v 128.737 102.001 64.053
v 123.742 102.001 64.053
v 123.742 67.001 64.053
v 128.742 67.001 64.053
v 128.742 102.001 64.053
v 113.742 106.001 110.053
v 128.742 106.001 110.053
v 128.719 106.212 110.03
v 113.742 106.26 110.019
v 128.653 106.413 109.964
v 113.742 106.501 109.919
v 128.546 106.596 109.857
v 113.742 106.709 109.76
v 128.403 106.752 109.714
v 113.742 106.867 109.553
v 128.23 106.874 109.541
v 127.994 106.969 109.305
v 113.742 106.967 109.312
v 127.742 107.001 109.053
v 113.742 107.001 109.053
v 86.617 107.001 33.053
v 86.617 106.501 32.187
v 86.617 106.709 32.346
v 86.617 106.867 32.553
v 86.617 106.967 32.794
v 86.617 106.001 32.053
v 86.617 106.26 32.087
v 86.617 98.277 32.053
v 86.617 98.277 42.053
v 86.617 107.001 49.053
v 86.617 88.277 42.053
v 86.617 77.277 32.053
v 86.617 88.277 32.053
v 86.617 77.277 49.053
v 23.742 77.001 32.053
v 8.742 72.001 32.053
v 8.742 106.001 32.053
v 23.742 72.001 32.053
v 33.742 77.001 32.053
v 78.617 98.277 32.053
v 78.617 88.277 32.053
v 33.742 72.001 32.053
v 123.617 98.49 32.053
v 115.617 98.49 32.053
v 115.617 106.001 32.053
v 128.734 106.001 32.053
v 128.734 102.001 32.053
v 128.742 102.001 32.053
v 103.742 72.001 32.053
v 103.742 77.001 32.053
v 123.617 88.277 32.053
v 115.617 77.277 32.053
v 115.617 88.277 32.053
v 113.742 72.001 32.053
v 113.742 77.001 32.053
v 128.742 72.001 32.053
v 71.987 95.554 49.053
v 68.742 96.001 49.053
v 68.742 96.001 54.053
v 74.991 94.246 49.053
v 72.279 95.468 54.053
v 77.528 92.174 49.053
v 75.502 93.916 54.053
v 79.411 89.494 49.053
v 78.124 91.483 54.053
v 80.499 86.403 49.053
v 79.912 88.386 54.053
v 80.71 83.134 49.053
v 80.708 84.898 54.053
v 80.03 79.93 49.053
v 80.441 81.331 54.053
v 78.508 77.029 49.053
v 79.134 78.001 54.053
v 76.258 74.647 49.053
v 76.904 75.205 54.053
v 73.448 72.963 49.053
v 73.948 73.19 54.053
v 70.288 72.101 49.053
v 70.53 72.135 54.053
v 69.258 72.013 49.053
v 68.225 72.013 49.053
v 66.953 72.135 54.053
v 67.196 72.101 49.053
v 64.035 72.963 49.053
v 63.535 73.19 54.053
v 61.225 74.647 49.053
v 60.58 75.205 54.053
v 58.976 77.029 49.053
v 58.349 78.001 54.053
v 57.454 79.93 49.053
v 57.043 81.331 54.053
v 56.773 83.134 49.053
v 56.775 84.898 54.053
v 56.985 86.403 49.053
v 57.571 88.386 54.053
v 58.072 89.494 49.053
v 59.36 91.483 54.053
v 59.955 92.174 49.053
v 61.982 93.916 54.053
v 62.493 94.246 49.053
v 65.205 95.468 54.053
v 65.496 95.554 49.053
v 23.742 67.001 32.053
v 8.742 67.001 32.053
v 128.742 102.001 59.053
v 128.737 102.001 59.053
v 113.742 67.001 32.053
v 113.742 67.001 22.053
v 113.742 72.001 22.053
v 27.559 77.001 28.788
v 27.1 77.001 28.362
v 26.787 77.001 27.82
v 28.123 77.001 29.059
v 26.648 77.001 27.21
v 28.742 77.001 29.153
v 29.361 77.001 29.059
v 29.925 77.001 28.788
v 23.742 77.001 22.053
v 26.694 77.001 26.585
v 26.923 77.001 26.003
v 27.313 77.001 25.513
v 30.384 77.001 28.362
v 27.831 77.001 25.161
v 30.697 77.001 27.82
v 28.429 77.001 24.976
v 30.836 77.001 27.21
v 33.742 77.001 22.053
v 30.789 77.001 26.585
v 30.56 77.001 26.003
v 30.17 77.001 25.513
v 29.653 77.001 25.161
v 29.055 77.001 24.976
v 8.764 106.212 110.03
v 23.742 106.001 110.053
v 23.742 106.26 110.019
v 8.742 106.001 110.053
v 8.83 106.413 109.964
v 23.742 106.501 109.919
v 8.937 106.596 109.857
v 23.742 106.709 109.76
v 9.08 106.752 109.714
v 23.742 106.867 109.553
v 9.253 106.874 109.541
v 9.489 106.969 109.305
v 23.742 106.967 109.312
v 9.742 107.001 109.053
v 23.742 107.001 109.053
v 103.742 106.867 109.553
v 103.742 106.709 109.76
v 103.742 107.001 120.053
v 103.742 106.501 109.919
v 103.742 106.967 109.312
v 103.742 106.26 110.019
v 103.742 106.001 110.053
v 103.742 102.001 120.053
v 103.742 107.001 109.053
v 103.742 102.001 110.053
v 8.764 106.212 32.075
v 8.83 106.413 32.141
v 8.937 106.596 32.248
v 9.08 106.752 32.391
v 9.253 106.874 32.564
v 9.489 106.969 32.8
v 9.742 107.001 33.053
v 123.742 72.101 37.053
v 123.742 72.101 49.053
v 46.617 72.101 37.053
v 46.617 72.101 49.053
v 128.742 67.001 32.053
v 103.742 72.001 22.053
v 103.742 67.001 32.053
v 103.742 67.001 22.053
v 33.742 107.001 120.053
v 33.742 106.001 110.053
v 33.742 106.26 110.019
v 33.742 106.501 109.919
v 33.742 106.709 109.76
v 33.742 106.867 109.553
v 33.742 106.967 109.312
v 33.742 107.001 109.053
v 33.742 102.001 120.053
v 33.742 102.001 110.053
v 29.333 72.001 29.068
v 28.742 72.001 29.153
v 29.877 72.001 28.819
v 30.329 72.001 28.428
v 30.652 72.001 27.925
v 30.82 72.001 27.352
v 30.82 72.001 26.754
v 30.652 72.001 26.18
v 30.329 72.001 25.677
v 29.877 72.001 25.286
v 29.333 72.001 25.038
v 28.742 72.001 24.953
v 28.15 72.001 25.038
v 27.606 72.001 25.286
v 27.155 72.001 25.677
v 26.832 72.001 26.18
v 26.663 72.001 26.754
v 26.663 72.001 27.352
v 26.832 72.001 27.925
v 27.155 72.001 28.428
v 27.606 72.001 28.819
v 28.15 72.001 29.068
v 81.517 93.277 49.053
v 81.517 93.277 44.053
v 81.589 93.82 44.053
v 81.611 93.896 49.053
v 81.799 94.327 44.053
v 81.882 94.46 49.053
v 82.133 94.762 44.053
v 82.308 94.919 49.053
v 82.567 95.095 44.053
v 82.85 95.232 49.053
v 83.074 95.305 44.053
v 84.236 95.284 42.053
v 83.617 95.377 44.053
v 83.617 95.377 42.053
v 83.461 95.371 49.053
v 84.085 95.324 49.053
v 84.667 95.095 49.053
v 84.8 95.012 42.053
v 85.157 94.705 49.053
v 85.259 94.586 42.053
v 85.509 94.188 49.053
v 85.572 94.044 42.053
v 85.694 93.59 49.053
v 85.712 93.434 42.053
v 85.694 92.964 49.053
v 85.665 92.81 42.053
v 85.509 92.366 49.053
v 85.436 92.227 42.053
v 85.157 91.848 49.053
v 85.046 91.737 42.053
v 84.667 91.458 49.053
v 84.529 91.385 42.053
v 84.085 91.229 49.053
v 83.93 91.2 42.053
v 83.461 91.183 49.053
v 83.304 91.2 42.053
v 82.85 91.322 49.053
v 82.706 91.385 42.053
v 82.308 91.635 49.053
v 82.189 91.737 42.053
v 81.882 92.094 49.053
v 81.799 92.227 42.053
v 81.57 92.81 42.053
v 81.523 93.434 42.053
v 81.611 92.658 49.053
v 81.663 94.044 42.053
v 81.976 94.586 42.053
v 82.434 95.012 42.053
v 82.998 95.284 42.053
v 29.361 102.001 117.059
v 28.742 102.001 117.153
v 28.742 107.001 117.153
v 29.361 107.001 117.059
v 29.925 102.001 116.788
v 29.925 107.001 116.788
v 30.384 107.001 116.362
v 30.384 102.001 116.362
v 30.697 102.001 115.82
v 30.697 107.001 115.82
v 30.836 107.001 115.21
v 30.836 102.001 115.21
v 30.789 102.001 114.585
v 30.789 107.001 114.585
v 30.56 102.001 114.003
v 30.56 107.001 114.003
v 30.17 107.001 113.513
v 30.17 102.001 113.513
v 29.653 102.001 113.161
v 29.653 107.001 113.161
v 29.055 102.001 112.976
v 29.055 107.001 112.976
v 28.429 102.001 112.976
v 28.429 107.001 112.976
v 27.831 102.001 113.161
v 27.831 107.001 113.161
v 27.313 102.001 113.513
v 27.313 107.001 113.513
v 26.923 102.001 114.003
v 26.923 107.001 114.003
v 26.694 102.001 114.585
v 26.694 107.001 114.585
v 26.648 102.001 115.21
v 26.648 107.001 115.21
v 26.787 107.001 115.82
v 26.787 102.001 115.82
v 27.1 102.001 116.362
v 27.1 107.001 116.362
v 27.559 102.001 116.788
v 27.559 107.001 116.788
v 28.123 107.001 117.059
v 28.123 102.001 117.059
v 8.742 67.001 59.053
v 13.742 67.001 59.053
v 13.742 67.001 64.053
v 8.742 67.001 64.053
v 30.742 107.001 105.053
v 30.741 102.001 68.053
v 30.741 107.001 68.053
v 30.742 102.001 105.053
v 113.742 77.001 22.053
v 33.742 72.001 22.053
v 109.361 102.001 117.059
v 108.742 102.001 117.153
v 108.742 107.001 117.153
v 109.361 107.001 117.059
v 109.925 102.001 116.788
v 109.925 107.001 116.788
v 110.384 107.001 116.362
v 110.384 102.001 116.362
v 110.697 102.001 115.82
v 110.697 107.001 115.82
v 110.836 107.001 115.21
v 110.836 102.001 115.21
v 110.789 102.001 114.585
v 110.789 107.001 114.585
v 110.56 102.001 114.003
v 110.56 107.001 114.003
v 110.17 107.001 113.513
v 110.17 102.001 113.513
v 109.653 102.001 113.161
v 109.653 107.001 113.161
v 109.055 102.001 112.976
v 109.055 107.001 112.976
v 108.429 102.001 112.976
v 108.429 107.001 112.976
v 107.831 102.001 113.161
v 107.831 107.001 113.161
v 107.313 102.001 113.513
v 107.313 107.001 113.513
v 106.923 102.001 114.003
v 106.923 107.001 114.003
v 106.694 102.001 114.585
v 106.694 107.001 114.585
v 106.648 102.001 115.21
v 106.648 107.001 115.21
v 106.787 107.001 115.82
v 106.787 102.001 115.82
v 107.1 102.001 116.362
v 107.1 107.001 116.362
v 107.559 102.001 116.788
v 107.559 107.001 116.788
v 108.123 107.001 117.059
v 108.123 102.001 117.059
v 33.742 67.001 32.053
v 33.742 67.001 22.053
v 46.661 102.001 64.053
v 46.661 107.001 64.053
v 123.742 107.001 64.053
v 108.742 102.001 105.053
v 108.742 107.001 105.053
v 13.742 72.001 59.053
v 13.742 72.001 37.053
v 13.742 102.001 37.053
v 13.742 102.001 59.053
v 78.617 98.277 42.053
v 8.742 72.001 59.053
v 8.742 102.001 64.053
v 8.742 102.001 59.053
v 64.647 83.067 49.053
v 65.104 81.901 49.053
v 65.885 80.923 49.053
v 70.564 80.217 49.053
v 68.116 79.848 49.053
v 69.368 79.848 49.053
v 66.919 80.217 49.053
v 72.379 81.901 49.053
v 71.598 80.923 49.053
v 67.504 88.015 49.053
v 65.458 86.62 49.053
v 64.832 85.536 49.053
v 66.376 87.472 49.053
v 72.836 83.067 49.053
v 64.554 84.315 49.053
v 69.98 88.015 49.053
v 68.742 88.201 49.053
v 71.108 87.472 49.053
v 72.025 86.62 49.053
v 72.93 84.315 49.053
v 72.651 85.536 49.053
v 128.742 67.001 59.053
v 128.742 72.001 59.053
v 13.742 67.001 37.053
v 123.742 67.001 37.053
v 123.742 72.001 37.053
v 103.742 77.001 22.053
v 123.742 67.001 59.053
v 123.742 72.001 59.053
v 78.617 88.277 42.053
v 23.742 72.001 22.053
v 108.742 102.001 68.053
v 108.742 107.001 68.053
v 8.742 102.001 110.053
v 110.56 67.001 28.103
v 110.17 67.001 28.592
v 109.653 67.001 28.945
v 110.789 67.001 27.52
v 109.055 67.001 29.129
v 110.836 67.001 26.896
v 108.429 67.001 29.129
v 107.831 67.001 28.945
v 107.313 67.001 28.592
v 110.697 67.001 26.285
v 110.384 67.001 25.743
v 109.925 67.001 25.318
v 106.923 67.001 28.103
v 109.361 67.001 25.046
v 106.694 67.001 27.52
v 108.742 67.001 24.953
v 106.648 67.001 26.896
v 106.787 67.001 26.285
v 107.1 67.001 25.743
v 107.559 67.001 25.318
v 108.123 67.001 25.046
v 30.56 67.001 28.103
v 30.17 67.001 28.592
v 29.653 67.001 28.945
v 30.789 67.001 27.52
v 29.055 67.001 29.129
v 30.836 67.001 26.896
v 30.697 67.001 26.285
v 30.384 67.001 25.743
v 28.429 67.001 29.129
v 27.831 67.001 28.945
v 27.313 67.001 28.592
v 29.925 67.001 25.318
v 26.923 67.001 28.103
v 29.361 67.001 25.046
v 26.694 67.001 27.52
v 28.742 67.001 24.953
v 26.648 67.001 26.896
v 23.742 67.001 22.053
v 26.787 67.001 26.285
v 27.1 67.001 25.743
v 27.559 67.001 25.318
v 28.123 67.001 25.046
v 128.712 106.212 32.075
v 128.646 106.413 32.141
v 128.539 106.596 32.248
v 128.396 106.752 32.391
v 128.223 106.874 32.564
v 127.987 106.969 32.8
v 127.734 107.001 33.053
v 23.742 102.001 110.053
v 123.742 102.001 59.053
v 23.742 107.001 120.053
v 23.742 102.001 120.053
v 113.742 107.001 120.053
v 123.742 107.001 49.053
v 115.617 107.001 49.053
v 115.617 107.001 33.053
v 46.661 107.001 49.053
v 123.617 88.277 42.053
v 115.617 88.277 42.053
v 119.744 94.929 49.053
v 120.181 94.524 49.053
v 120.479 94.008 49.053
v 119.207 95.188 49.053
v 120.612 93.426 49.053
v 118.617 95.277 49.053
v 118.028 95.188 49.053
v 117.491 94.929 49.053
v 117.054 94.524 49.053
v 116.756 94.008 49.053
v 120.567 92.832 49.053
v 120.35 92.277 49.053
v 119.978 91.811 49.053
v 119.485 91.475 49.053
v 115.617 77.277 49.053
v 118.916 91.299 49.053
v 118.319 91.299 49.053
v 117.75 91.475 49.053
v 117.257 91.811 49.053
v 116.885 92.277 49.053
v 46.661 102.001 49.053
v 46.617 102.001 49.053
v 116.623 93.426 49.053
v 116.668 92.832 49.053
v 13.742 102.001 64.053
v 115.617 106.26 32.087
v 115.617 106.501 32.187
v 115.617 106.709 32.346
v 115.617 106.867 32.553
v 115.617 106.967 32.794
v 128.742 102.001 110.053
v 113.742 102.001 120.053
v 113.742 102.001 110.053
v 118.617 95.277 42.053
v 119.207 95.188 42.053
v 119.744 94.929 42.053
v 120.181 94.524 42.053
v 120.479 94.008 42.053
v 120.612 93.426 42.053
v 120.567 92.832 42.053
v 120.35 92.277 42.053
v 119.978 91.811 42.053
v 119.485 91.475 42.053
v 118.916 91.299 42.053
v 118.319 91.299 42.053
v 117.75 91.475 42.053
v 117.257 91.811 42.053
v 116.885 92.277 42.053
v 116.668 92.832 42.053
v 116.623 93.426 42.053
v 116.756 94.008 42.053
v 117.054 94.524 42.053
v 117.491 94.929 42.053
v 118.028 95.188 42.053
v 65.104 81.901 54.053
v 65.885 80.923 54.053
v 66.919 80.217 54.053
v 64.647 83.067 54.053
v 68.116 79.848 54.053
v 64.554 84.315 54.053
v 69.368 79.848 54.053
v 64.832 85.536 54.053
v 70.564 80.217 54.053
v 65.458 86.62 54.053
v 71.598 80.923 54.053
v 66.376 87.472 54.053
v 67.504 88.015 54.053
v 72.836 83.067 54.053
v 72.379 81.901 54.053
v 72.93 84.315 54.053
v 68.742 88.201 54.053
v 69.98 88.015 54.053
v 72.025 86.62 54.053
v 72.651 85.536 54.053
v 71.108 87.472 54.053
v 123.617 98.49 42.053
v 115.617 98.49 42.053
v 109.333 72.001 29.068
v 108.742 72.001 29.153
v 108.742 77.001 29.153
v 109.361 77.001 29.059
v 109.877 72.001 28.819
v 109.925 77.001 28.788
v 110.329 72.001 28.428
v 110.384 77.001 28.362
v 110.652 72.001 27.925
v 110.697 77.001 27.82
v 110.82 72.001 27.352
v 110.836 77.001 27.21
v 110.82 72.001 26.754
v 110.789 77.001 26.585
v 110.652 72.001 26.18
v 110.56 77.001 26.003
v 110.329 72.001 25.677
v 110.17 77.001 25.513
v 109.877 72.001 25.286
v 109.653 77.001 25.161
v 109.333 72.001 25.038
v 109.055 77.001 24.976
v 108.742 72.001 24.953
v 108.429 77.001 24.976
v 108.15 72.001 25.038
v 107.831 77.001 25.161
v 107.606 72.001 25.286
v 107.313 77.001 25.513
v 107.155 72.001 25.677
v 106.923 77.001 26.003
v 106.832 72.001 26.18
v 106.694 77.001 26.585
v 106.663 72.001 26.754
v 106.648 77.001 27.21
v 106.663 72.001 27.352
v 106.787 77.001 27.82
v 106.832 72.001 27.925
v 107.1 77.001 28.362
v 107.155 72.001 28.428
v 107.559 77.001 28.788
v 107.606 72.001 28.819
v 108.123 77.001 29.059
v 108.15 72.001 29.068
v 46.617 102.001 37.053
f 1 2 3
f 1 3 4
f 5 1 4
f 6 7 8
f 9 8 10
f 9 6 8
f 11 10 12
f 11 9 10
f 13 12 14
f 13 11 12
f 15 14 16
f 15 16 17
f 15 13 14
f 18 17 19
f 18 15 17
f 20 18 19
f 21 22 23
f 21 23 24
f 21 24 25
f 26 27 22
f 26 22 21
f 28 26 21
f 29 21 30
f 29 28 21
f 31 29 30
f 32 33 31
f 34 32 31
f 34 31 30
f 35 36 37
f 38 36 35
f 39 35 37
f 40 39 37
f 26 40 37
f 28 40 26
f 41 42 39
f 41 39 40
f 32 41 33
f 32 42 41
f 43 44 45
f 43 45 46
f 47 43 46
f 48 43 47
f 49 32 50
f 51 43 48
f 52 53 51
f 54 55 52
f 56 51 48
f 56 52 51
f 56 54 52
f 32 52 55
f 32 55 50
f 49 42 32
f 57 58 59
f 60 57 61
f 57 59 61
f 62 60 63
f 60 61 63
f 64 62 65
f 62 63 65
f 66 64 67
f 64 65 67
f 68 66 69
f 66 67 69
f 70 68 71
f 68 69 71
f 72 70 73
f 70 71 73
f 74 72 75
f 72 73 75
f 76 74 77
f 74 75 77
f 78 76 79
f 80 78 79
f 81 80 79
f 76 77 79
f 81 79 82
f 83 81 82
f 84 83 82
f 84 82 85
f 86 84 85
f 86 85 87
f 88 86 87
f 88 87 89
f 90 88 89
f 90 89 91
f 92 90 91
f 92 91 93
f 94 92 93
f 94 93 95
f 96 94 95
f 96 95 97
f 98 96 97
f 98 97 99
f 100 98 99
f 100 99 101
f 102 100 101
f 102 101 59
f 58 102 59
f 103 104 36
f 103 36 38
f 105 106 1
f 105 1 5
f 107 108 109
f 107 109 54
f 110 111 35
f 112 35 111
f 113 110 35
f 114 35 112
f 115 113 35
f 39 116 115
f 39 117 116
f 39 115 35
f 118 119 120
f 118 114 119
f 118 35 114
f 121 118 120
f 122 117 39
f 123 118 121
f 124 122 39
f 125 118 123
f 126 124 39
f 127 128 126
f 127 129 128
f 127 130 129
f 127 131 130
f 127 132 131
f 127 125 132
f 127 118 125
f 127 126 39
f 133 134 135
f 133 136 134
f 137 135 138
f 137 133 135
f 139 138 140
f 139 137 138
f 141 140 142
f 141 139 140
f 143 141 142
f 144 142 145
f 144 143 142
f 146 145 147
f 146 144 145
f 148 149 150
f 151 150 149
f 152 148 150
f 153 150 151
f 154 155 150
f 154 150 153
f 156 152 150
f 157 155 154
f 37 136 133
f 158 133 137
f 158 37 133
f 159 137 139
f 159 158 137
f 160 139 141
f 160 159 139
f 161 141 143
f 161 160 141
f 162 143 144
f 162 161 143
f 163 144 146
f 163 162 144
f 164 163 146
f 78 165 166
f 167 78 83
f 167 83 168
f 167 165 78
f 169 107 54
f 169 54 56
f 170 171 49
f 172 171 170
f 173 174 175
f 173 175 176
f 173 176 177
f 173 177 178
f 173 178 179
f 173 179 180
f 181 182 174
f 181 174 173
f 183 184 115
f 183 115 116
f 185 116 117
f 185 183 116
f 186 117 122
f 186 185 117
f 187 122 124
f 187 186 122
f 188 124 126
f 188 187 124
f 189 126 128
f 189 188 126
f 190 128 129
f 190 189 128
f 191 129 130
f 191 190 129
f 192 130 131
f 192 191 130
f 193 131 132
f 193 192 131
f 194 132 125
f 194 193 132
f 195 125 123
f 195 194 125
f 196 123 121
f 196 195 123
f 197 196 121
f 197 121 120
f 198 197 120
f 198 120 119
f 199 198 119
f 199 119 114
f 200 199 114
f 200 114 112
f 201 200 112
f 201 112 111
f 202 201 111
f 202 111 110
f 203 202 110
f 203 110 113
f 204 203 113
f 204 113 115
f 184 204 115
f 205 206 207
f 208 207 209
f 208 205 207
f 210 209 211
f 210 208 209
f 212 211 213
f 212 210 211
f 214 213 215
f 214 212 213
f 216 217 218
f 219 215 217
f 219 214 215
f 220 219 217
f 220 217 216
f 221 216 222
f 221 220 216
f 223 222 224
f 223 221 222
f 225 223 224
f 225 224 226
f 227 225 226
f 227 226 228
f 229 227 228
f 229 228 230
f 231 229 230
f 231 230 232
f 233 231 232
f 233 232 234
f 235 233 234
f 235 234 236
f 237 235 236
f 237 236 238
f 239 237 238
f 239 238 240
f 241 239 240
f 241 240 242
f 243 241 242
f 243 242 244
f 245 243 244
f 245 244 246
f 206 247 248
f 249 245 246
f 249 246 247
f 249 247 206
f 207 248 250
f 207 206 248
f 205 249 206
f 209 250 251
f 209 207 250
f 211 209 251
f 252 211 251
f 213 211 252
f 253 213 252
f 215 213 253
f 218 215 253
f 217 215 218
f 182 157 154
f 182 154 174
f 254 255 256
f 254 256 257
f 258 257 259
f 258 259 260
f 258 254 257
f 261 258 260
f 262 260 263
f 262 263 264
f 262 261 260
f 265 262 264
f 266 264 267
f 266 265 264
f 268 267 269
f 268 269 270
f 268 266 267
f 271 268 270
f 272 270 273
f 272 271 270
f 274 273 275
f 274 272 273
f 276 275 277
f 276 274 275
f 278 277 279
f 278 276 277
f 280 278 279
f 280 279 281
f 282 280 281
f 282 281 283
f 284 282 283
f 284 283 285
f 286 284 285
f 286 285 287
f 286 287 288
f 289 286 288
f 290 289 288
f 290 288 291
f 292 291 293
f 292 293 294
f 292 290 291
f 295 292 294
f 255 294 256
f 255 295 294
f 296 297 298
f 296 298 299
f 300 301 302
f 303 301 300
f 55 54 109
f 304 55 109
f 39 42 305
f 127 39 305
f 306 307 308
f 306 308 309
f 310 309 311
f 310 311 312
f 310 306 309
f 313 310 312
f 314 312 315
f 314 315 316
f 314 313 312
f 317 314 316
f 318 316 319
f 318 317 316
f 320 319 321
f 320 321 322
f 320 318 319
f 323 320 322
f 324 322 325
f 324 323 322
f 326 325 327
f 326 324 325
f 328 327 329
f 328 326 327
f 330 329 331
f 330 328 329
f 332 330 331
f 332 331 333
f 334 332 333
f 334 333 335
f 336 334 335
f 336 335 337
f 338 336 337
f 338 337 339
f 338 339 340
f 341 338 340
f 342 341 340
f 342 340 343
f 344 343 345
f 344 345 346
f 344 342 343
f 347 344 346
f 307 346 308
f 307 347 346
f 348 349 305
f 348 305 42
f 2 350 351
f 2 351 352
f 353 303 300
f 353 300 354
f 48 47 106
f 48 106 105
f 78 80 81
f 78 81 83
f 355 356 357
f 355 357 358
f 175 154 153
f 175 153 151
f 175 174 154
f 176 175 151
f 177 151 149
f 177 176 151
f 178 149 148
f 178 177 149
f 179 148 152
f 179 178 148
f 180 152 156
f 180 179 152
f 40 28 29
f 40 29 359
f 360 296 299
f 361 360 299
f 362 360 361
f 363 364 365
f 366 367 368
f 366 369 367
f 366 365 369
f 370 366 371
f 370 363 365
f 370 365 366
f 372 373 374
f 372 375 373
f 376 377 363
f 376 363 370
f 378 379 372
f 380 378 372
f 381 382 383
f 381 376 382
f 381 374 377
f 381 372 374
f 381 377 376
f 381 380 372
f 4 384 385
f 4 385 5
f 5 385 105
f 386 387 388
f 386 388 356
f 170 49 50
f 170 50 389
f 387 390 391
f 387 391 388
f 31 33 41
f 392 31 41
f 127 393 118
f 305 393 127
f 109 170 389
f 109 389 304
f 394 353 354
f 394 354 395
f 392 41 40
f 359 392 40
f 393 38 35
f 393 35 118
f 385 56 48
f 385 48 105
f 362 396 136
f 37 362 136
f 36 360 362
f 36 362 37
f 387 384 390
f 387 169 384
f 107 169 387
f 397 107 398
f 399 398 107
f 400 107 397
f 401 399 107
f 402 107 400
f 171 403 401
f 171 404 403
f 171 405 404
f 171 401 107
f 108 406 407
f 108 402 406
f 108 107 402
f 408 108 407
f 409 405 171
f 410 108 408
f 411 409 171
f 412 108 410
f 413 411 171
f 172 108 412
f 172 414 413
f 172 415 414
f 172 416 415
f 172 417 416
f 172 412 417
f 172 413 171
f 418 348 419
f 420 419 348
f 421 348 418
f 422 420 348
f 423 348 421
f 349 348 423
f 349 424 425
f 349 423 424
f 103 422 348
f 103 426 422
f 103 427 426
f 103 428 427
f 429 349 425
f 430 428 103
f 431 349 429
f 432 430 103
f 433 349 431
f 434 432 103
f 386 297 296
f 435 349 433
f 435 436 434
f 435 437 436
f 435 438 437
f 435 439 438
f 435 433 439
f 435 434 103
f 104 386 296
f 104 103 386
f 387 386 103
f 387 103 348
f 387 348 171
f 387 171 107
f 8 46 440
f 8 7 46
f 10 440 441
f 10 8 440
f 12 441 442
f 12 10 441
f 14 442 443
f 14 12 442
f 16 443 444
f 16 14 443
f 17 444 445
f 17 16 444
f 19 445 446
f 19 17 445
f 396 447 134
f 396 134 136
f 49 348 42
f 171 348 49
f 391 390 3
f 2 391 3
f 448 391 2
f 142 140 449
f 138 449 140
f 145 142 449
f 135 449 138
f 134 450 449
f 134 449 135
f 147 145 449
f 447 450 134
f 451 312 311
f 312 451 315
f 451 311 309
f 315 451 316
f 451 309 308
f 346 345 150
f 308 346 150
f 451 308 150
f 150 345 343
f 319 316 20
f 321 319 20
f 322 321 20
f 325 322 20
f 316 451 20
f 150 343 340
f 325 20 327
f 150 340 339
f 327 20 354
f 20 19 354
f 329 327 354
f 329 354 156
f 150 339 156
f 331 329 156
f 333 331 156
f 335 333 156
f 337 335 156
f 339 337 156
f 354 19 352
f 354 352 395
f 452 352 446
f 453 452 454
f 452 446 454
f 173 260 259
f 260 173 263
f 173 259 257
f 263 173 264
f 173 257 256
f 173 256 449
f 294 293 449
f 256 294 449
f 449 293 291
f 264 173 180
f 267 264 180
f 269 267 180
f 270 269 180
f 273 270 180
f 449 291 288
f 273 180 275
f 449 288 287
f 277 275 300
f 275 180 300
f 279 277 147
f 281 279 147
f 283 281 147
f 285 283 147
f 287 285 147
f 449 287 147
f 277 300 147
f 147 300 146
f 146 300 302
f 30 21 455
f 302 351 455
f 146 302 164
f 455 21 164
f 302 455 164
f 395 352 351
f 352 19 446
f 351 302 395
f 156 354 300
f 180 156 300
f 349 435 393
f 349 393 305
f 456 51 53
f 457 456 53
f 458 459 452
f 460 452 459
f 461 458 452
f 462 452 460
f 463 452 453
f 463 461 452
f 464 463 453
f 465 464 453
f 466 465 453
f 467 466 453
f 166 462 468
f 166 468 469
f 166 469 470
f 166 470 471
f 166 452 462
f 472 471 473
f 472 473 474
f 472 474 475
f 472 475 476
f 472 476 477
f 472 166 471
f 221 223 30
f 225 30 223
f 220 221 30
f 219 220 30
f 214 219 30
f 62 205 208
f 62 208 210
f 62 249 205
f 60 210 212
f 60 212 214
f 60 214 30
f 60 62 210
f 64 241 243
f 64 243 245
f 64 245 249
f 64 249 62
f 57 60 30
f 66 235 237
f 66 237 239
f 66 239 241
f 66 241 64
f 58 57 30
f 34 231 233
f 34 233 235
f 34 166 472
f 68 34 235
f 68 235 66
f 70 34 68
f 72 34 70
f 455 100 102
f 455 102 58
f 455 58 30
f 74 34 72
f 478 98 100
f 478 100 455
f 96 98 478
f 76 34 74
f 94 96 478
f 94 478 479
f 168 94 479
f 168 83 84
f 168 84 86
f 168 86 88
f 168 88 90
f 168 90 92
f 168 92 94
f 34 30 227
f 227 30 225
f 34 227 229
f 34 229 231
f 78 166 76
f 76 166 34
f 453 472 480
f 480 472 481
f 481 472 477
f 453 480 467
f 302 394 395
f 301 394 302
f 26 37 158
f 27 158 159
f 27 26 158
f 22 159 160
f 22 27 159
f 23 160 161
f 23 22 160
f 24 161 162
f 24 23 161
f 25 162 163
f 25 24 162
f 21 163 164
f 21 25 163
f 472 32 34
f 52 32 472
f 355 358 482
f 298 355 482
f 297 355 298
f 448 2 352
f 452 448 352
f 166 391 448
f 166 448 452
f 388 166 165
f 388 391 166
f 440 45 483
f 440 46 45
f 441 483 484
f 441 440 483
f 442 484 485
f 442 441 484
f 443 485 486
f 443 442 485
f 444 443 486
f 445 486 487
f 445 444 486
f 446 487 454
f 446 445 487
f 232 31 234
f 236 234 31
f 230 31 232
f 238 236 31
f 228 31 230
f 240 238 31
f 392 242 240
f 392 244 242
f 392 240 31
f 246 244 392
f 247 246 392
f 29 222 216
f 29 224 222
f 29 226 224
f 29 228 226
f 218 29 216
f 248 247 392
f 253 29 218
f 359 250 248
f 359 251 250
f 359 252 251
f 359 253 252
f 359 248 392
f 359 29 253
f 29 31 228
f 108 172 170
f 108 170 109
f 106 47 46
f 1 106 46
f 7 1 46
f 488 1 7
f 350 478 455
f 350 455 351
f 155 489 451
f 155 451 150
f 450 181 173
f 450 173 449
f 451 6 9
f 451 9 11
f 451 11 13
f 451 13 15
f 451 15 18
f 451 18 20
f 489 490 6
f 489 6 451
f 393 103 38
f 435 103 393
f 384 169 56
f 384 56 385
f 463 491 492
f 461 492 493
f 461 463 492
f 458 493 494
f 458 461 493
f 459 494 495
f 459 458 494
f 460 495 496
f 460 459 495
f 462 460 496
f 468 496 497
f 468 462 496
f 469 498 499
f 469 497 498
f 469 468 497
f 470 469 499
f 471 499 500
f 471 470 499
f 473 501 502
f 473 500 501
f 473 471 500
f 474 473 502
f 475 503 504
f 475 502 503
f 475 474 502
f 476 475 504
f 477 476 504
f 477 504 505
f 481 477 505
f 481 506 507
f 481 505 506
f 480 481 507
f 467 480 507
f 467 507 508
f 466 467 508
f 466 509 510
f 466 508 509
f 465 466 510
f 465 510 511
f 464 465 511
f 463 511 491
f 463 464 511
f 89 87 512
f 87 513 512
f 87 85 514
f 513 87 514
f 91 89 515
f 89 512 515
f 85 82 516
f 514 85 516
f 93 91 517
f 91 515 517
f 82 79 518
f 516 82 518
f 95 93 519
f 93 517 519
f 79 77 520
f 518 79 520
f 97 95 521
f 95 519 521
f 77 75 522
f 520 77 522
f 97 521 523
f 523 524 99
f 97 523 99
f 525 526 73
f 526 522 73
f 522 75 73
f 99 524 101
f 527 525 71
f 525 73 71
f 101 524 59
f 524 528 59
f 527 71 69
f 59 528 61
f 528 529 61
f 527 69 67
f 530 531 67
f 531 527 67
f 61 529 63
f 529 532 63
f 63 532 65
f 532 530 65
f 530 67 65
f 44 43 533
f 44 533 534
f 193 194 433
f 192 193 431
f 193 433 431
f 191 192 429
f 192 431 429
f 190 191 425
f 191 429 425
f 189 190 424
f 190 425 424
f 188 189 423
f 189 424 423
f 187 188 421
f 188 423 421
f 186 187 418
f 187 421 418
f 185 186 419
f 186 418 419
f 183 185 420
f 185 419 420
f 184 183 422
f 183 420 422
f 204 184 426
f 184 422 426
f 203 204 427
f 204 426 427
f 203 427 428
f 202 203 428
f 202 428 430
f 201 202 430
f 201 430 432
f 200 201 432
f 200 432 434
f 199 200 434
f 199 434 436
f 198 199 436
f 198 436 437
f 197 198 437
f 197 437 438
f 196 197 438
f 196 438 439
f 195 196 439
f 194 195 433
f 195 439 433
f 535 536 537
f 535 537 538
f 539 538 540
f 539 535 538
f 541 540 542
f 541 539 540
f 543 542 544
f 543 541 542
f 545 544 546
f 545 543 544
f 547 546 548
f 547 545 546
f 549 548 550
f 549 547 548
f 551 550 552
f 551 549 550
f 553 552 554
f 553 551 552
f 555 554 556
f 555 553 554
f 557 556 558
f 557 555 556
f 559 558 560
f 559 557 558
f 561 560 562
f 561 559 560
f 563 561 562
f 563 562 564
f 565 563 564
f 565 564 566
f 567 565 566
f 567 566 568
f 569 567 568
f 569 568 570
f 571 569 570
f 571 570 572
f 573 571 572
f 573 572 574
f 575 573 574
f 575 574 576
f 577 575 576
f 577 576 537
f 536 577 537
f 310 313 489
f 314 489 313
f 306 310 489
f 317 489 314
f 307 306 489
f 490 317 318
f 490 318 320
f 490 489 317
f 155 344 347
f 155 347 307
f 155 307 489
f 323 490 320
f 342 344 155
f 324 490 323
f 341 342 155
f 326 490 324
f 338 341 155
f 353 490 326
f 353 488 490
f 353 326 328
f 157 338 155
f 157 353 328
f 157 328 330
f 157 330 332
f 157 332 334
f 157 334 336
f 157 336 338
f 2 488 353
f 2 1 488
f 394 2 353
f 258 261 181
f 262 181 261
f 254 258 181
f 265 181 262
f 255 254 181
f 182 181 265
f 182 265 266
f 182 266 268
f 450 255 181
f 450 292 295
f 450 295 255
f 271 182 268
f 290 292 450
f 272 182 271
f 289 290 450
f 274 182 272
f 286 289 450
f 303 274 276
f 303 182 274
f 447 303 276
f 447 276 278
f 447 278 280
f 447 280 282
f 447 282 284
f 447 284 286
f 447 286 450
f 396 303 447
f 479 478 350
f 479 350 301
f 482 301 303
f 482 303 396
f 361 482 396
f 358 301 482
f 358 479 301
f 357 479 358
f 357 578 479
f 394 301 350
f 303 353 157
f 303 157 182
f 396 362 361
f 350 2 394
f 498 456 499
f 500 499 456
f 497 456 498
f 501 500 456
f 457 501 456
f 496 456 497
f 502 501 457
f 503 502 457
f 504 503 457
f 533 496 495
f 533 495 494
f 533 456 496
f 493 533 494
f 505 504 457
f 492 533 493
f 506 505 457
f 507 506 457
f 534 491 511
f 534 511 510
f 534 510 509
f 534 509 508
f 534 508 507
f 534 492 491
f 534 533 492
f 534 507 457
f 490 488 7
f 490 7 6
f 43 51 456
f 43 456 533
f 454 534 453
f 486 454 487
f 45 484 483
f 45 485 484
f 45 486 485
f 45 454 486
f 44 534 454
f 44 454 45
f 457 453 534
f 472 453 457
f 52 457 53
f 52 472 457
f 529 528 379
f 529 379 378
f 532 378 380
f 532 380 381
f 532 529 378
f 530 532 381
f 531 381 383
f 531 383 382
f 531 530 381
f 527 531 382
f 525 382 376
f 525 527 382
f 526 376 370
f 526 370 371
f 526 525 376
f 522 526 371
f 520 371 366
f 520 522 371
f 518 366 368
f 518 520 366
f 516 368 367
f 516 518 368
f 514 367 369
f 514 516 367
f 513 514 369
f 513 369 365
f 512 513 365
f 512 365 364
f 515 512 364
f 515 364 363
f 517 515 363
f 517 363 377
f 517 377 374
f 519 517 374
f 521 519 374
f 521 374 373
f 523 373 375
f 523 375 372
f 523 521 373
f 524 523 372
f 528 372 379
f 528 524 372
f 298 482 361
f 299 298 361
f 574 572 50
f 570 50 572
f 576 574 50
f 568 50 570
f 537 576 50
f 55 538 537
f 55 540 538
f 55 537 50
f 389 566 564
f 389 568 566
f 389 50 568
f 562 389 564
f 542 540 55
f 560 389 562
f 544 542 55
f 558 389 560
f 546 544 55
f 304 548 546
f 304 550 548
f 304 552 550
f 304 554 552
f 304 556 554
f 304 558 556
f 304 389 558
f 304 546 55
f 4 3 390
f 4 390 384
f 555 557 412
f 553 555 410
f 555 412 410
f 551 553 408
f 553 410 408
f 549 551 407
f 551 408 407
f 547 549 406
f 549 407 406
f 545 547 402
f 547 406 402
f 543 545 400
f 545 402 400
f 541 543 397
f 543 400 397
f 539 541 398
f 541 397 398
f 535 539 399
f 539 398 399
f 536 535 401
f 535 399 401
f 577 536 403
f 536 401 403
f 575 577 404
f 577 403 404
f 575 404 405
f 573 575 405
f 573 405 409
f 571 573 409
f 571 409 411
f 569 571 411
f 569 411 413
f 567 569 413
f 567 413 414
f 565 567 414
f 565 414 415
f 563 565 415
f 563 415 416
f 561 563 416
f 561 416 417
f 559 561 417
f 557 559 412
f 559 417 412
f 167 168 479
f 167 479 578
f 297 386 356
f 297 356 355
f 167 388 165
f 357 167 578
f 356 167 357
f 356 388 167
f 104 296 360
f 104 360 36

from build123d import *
from build123d.topology import SkipClean

# Parameters (mm, degrees)
SKETCH_1_R           = 12
SKETCH_1_R_2         = 4.2
EXTRUDE_1_DEPTH      = 5
SKETCH_2_R           = 2
EXTRUDE_2_DEPTH      = 5
SKETCH_3_W           = 77.124309302
SKETCH_3_H           = 14.9
EXTRUDE_3_DEPTH      = 7
EXTRUDE_6_DEPTH      = 30
SKETCH_5_W           = 29
SKETCH_5_H           = 24.72460325
CUT_EXTRUDE_16_DEPTH = 30
SKETCH_9_R           = 2.1
SKETCH_9_R_2         = 2
CUT_EXTRUDE_17_DEPTH = 17
SKETCH_6_W           = 10
SKETCH_6_H           = 10
SKETCH_6_R           = 2.1
EXTRUDE_12_DEPTH     = 5
SKETCH_7_W           = 8.124309302
SKETCH_7_H           = 7
EXTRUDE_26_DEPTH     = 30
SKETCH_7_W_2         = 40
EXTRUDE_26_2_DEPTH   = 30
SKETCH_8_W           = 29
SKETCH_8_H           = 7
EXTRUDE_29_DEPTH     = 5.27539675
SKETCH_16_R          = 2
SKETCH_16_R_2        = 2.1
CUT_EXTRUDE_19_DEPTH = 17
SKETCH_18_W          = 8
SKETCH_18_H          = 10
SKETCH_18_H_2        = 10.213480618
CUT_EXTRUDE_20_DEPTH = 10
SKETCH_19_R          = 2.1
EXTRUDE_34_DEPTH     = 5
FILLET_1_R           = 1
SKETCH_20_W          = 77.124309302
SKETCH_20_H          = 12
CUT_EXTRUDE_22_DEPTH = 15
EXTRUDE_START        = 5
SKETCH_21_R          = 2.1
EXTRUDE_38_DEPTH     = 5
SKETCH_22_W          = 5
SKETCH_22_H          = 35
EXTRUDE_39_DEPTH     = 5


with BuildPart() as part:
    # Эскиз1 → Бобышка-Вытянуть1 (new body)
    with BuildSketch(Plane(origin=(0, 0, 54.052702475), x_dir=(-1, 0, 0), z_dir=(0, 0, -1))):
        with Locations(Location((-68.741769048, 84.001425994, 0), (0, 0, 90))):
            Circle(SKETCH_1_R)
        with Locations(Location((-68.741769048, 84.001425994, 0), (0, 0, 90))):
            Circle(SKETCH_1_R_2, mode=Mode.SUBTRACT)
    extrude(amount=EXTRUDE_1_DEPTH)

    # Эскиз2 → Бобышка-Вытянуть2 (add)
    with BuildSketch(Plane(origin=(0, 0, 49.052702475), x_dir=(-1, 0, 0), z_dir=(0, 0, -1))):
        Polygon((-115.617459746, 77.276822744), (-86.617459746, 77.276822744), (-86.617459746, 93.276822744), (-86.617459746, 102.001425994), (-46.617459746, 102.001425994), (-46.617459746, 57.101425994), (-123.741769048, 57.101425994), (-123.741769048, 102.001425994), (-115.617459746, 102.001425994), (-115.617459746, 93.276822744), align=None)
        with Locations(Location((-118.617459746, 93.276822744, 0), (0, 0, 90))):
            Circle(SKETCH_2_R, mode=Mode.SUBTRACT)
        with Locations(Location((-83.617459746, 93.276822744, 0), (0, 0, 90))):
            Circle(SKETCH_2_R, mode=Mode.SUBTRACT)
    extrude(amount=EXTRUDE_2_DEPTH)

    # Эскиз3 → Бобышка-Вытянуть3 (add)
    with BuildSketch(Plane(origin=(0, 0, 44.052702475), x_dir=(-1, 0, 0), z_dir=(0, 0, -1))):
        with Locations((-85.179614397, 64.551425994)):
            Rectangle(SKETCH_3_W, SKETCH_3_H)
    extrude(amount=EXTRUDE_3_DEPTH)


with BuildPart() as body_2:
    # Эскиз4 → Бобышка-Вытянуть6 (new body)
    with BuildSketch(Plane(origin=(0, 72.001425994, 0), x_dir=(1, 0, 0), z_dir=(0, 1, 0))):
        Polygon((123.741769048, -37.052702475), (13.741769048, -37.052702475), (13.741769048, -59.052702475), (8.741769048, -59.052702475), (8.741769048, -32.052702475), (128.741769048, -32.052702475), (128.741769048, -59.052702475), (123.741769048, -59.052702475), align=None)
    extrude(amount=EXTRUDE_6_DEPTH)

    # Эскиз5 → Вырез-Вытянуть16 (cut)
    with BuildSketch(Plane(origin=(0, 0, 44.052702475), x_dir=(-1, 0, 0), z_dir=(0, 0, -1))):
        with Locations((-101.117459746, 89.639124369)):
            Rectangle(SKETCH_5_W, SKETCH_5_H)
    extrude(amount=CUT_EXTRUDE_16_DEPTH, mode=Mode.SUBTRACT)


with BuildPart() as cut_extrude_17_tool:
    # Эскиз9 → Вырез-Вытянуть17 (new body)
    with BuildSketch(Plane(origin=(0, 0, 49.052702475), x_dir=(-1, 0, 0), z_dir=(0, 0, -1))):
        with Locations((-83.617459746, 93.276822744)):
            Circle(SKETCH_9_R)
        with Locations(Location((-118.617459746, 93.276822744, 0), (0, 0, 90))):
            Circle(SKETCH_9_R_2)
    extrude(amount=CUT_EXTRUDE_17_DEPTH)


with BuildPart() as part_1:
    add(part.part)

    # Вырез-Вытянуть17: cut by cut_extrude_17_tool
    add(cut_extrude_17_tool.part, mode=Mode.SUBTRACT)



with BuildPart() as body_2_1:
    add(body_2.part)

    # Вырез-Вытянуть17: cut by cut_extrude_17_tool
    add(cut_extrude_17_tool.part, mode=Mode.SUBTRACT)

    # Эскиз6 → Бобышка-Вытянуть12 (add)
    # profile 1 of 2: a face of its own
    with BuildSketch(Plane(origin=(0, 72.001425994, 0), x_dir=(1, 0, 0), z_dir=(0, 1, 0))):
        with Locations((28.741769048, -27.052702475)):
            Rectangle(SKETCH_6_W, SKETCH_6_H)
        with Locations(Location((28.741769048, -27.052702475, 0), (0, 0, 270))):
            Circle(SKETCH_6_R, mode=Mode.SUBTRACT)
    # profile 2 of 2: a face of its own
    with BuildSketch(Plane(origin=(0, 72.001425994, 0), x_dir=(1, 0, 0), z_dir=(0, 1, 0))):
        with Locations((108.741769048, -27.052702475)):
            Rectangle(SKETCH_6_W, SKETCH_6_H)
        with Locations(Location((108.741769048, -27.052702475, 0), (0, 0, 270))):
            Circle(SKETCH_6_R, mode=Mode.SUBTRACT)
    extrude(amount=EXTRUDE_12_DEPTH)


with BuildPart() as body_3:
    # Эскиз7 → Бобышка-Вытянуть26 (new body)
    with BuildSketch(Plane(origin=(0, 72.001425994, 0), x_dir=(1, 0, 0), z_dir=(0, 1, 0))):
        with Locations((119.679614397, -40.552702475)):
            Rectangle(SKETCH_7_W, SKETCH_7_H)
    extrude(amount=EXTRUDE_26_DEPTH)


with BuildPart() as body_4:
    # Эскиз7 → Extrude 26 2 (new body)
    with BuildSketch(Plane(origin=(0, 72.001425994, 0), x_dir=(1, 0, 0), z_dir=(0, 1, 0))):
        with Locations((66.617459746, -40.552702475)):
            Rectangle(SKETCH_7_W_2, SKETCH_7_H)
    extrude(amount=EXTRUDE_26_2_DEPTH)


with BuildPart() as part_2:
    add(part_1.part)

    add(body_2_1.part)  # Бобышка-Вытянуть29 merges body 2

    add(body_3.part)  # Бобышка-Вытянуть29 merges body 3

    add(body_4.part)  # Бобышка-Вытянуть29 merges body 4
    # Эскиз8 → Бобышка-Вытянуть29 (add)
    with BuildSketch(Plane(origin=(0, 72.001425994, 0), x_dir=(1, 0, 0), z_dir=(0, 1, 0))):
        with Locations((101.117459746, -40.552702475)):
            Rectangle(SKETCH_8_W, SKETCH_8_H)
    extrude(amount=EXTRUDE_29_DEPTH)

    # Эскиз16 → Вырез-Вытянуть19 (cut)
    with BuildSketch(Plane(origin=(0, 0, 49.052702475), x_dir=(-1, 0, 0), z_dir=(0, 0, -1))):
        with Locations(Location((-118.617459746, 93.276822744, 0), (0, 0, 90))):
            Circle(SKETCH_16_R)
        with Locations(Location((-83.617459746, 93.276822744, 0), (0, 0, 90))):
            Circle(SKETCH_16_R_2)
    extrude(amount=CUT_EXTRUDE_19_DEPTH, mode=Mode.SUBTRACT)

    # Эскиз18 → Вырез-Вытянуть20 (cut)
    with BuildSketch(Plane(origin=(0, 0, 32.052702475), x_dir=(-1, 0, 0), z_dir=(0, 0, -1))):
        with Locations((-82.617459746, 93.276822744)):
            Rectangle(SKETCH_18_W, SKETCH_18_H)
        with Locations((-119.617459746, 93.383563053)):
            Rectangle(SKETCH_18_W, SKETCH_18_H_2)
    extrude(amount=-CUT_EXTRUDE_20_DEPTH, mode=Mode.SUBTRACT)

    # Эскиз19 → Бобышка-Вытянуть34 (add)
    with BuildSketch(Plane(origin=(0, 102.001425994, 0), x_dir=(1, 0, 0), z_dir=(0, 1, 0))):
        Polygon((8.741769048, -32.052702475), (86.617459746, -32.052702475), (86.617459746, -49.052702475), (46.660621761, -49.052702475), (46.660621761, -64.052702475), (123.741769048, -64.052702475), (123.741769048, -49.052702475), (115.617459746, -49.052702475), (115.617459746, -32.052702475), (128.73426593, -32.052702475), (128.741769048, -110.052702475), (113.741769048, -110.052702475), (113.741769048, -120.052702475), (103.741769048, -120.052702475), (103.741769048, -110.052702475), (33.741769048, -110.052702475), (33.741769048, -120.052702475), (23.741769048, -120.052702475), (23.741769048, -110.052702475), (8.741769048, -110.052702475), align=None)
        with Locations(Location((28.741769048, -115.052702475, 0), (0, 0, 270))):
            Circle(SKETCH_19_R, mode=Mode.SUBTRACT)
        with Locations(Location((108.741769048, -115.052702475, 0), (0, 0, 270))):
            Circle(SKETCH_19_R, mode=Mode.SUBTRACT)
        Polygon((30.740691522, -68.052702475), (30.741769048, -105.052702475), (108.741769048, -105.052702475), (108.741769048, -68.052702475), align=None, mode=Mode.SUBTRACT)
    extrude(amount=EXTRUDE_34_DEPTH)

    # Скругление1
    fillet_1_edges = [part_2.edges().sort_by_distance(p)[0] for p in [
        (8.741769048, 107.001425994, 71.052702475),
        (16.241769048, 107.001425994, 110.052702475),
        (68.741769048, 107.001425994, 110.052702475),
        (121.241769048, 107.001425994, 110.052702475),
        (128.738017489, 107.001425994, 71.052702475),
        (122.175862838, 107.001425994, 32.052702475),
        (47.679614397, 107.001425994, 32.052702475),
    ]]
    fillet(fillet_1_edges, radius=FILLET_1_R)

    # Эскиз20 → Вырез-Вытянуть22 (cut)
    with BuildSketch(Plane(origin=(0, 57.101425994, 0), x_dir=(-1, 0, 0), z_dir=(0, -1, 0))):
        with Locations((-85.179614397, -43.052702475)):
            Rectangle(SKETCH_20_W, SKETCH_20_H)
    extrude(amount=-CUT_EXTRUDE_22_DEPTH, mode=Mode.SUBTRACT)

    # Эскиз21 → Бобышка-Вытянуть38 (add)
    with SkipClean():  # the faces are left unmerged after this step: merging them gives an invalid solid
        with BuildSketch(Plane(origin=(0, 72.001425994, 0), x_dir=(-1, 0, 0), z_dir=(0, -1, 0)).offset(EXTRUDE_START)):
            Polygon((-128.741769048, -59.052702475), (-123.741769048, -59.052702475), (-123.741769048, -37.052702475), (-13.741769048, -37.052702475), (-13.741769048, -59.052702475), (-8.741769048, -59.052702475), (-8.741769048, -32.052702475), (-23.741769048, -32.052702475), (-23.741769048, -22.052702475), (-33.741769048, -22.052702475), (-33.741769048, -32.052702475), (-103.741769048, -32.052702475), (-103.741769048, -22.052702475), (-113.741769048, -22.052702475), (-113.741769048, -32.052702475), (-128.741769048, -32.052702475), align=None)
            with Locations(Location((-108.741769048, -27.052702475, 0), (0, 0, 90))):
                Circle(SKETCH_21_R, mode=Mode.SUBTRACT)
            with Locations(Location((-28.741769048, -27.052702475, 0), (0, 0, 90))):
                Circle(SKETCH_21_R, mode=Mode.SUBTRACT)
        extrude(amount=-EXTRUDE_38_DEPTH)

    # Эскиз22 → Бобышка-Вытянуть39 (add)
    with SkipClean():  # the faces are left unmerged after this step: merging them gives an invalid solid
        with BuildSketch(Plane.XY.offset(59.052702475)):
            Polygon((8.742163446, 102.001425994), (13.741769048, 102.001425994), (13.741769048, 67.001425994), (8.741769048, 67.001425994), align=None)
            with Locations((126.241769048, 84.501425994)):
                Rectangle(SKETCH_22_W, SKETCH_22_H)
        extrude(amount=EXTRUDE_39_DEPTH)


solid = part_2.part
